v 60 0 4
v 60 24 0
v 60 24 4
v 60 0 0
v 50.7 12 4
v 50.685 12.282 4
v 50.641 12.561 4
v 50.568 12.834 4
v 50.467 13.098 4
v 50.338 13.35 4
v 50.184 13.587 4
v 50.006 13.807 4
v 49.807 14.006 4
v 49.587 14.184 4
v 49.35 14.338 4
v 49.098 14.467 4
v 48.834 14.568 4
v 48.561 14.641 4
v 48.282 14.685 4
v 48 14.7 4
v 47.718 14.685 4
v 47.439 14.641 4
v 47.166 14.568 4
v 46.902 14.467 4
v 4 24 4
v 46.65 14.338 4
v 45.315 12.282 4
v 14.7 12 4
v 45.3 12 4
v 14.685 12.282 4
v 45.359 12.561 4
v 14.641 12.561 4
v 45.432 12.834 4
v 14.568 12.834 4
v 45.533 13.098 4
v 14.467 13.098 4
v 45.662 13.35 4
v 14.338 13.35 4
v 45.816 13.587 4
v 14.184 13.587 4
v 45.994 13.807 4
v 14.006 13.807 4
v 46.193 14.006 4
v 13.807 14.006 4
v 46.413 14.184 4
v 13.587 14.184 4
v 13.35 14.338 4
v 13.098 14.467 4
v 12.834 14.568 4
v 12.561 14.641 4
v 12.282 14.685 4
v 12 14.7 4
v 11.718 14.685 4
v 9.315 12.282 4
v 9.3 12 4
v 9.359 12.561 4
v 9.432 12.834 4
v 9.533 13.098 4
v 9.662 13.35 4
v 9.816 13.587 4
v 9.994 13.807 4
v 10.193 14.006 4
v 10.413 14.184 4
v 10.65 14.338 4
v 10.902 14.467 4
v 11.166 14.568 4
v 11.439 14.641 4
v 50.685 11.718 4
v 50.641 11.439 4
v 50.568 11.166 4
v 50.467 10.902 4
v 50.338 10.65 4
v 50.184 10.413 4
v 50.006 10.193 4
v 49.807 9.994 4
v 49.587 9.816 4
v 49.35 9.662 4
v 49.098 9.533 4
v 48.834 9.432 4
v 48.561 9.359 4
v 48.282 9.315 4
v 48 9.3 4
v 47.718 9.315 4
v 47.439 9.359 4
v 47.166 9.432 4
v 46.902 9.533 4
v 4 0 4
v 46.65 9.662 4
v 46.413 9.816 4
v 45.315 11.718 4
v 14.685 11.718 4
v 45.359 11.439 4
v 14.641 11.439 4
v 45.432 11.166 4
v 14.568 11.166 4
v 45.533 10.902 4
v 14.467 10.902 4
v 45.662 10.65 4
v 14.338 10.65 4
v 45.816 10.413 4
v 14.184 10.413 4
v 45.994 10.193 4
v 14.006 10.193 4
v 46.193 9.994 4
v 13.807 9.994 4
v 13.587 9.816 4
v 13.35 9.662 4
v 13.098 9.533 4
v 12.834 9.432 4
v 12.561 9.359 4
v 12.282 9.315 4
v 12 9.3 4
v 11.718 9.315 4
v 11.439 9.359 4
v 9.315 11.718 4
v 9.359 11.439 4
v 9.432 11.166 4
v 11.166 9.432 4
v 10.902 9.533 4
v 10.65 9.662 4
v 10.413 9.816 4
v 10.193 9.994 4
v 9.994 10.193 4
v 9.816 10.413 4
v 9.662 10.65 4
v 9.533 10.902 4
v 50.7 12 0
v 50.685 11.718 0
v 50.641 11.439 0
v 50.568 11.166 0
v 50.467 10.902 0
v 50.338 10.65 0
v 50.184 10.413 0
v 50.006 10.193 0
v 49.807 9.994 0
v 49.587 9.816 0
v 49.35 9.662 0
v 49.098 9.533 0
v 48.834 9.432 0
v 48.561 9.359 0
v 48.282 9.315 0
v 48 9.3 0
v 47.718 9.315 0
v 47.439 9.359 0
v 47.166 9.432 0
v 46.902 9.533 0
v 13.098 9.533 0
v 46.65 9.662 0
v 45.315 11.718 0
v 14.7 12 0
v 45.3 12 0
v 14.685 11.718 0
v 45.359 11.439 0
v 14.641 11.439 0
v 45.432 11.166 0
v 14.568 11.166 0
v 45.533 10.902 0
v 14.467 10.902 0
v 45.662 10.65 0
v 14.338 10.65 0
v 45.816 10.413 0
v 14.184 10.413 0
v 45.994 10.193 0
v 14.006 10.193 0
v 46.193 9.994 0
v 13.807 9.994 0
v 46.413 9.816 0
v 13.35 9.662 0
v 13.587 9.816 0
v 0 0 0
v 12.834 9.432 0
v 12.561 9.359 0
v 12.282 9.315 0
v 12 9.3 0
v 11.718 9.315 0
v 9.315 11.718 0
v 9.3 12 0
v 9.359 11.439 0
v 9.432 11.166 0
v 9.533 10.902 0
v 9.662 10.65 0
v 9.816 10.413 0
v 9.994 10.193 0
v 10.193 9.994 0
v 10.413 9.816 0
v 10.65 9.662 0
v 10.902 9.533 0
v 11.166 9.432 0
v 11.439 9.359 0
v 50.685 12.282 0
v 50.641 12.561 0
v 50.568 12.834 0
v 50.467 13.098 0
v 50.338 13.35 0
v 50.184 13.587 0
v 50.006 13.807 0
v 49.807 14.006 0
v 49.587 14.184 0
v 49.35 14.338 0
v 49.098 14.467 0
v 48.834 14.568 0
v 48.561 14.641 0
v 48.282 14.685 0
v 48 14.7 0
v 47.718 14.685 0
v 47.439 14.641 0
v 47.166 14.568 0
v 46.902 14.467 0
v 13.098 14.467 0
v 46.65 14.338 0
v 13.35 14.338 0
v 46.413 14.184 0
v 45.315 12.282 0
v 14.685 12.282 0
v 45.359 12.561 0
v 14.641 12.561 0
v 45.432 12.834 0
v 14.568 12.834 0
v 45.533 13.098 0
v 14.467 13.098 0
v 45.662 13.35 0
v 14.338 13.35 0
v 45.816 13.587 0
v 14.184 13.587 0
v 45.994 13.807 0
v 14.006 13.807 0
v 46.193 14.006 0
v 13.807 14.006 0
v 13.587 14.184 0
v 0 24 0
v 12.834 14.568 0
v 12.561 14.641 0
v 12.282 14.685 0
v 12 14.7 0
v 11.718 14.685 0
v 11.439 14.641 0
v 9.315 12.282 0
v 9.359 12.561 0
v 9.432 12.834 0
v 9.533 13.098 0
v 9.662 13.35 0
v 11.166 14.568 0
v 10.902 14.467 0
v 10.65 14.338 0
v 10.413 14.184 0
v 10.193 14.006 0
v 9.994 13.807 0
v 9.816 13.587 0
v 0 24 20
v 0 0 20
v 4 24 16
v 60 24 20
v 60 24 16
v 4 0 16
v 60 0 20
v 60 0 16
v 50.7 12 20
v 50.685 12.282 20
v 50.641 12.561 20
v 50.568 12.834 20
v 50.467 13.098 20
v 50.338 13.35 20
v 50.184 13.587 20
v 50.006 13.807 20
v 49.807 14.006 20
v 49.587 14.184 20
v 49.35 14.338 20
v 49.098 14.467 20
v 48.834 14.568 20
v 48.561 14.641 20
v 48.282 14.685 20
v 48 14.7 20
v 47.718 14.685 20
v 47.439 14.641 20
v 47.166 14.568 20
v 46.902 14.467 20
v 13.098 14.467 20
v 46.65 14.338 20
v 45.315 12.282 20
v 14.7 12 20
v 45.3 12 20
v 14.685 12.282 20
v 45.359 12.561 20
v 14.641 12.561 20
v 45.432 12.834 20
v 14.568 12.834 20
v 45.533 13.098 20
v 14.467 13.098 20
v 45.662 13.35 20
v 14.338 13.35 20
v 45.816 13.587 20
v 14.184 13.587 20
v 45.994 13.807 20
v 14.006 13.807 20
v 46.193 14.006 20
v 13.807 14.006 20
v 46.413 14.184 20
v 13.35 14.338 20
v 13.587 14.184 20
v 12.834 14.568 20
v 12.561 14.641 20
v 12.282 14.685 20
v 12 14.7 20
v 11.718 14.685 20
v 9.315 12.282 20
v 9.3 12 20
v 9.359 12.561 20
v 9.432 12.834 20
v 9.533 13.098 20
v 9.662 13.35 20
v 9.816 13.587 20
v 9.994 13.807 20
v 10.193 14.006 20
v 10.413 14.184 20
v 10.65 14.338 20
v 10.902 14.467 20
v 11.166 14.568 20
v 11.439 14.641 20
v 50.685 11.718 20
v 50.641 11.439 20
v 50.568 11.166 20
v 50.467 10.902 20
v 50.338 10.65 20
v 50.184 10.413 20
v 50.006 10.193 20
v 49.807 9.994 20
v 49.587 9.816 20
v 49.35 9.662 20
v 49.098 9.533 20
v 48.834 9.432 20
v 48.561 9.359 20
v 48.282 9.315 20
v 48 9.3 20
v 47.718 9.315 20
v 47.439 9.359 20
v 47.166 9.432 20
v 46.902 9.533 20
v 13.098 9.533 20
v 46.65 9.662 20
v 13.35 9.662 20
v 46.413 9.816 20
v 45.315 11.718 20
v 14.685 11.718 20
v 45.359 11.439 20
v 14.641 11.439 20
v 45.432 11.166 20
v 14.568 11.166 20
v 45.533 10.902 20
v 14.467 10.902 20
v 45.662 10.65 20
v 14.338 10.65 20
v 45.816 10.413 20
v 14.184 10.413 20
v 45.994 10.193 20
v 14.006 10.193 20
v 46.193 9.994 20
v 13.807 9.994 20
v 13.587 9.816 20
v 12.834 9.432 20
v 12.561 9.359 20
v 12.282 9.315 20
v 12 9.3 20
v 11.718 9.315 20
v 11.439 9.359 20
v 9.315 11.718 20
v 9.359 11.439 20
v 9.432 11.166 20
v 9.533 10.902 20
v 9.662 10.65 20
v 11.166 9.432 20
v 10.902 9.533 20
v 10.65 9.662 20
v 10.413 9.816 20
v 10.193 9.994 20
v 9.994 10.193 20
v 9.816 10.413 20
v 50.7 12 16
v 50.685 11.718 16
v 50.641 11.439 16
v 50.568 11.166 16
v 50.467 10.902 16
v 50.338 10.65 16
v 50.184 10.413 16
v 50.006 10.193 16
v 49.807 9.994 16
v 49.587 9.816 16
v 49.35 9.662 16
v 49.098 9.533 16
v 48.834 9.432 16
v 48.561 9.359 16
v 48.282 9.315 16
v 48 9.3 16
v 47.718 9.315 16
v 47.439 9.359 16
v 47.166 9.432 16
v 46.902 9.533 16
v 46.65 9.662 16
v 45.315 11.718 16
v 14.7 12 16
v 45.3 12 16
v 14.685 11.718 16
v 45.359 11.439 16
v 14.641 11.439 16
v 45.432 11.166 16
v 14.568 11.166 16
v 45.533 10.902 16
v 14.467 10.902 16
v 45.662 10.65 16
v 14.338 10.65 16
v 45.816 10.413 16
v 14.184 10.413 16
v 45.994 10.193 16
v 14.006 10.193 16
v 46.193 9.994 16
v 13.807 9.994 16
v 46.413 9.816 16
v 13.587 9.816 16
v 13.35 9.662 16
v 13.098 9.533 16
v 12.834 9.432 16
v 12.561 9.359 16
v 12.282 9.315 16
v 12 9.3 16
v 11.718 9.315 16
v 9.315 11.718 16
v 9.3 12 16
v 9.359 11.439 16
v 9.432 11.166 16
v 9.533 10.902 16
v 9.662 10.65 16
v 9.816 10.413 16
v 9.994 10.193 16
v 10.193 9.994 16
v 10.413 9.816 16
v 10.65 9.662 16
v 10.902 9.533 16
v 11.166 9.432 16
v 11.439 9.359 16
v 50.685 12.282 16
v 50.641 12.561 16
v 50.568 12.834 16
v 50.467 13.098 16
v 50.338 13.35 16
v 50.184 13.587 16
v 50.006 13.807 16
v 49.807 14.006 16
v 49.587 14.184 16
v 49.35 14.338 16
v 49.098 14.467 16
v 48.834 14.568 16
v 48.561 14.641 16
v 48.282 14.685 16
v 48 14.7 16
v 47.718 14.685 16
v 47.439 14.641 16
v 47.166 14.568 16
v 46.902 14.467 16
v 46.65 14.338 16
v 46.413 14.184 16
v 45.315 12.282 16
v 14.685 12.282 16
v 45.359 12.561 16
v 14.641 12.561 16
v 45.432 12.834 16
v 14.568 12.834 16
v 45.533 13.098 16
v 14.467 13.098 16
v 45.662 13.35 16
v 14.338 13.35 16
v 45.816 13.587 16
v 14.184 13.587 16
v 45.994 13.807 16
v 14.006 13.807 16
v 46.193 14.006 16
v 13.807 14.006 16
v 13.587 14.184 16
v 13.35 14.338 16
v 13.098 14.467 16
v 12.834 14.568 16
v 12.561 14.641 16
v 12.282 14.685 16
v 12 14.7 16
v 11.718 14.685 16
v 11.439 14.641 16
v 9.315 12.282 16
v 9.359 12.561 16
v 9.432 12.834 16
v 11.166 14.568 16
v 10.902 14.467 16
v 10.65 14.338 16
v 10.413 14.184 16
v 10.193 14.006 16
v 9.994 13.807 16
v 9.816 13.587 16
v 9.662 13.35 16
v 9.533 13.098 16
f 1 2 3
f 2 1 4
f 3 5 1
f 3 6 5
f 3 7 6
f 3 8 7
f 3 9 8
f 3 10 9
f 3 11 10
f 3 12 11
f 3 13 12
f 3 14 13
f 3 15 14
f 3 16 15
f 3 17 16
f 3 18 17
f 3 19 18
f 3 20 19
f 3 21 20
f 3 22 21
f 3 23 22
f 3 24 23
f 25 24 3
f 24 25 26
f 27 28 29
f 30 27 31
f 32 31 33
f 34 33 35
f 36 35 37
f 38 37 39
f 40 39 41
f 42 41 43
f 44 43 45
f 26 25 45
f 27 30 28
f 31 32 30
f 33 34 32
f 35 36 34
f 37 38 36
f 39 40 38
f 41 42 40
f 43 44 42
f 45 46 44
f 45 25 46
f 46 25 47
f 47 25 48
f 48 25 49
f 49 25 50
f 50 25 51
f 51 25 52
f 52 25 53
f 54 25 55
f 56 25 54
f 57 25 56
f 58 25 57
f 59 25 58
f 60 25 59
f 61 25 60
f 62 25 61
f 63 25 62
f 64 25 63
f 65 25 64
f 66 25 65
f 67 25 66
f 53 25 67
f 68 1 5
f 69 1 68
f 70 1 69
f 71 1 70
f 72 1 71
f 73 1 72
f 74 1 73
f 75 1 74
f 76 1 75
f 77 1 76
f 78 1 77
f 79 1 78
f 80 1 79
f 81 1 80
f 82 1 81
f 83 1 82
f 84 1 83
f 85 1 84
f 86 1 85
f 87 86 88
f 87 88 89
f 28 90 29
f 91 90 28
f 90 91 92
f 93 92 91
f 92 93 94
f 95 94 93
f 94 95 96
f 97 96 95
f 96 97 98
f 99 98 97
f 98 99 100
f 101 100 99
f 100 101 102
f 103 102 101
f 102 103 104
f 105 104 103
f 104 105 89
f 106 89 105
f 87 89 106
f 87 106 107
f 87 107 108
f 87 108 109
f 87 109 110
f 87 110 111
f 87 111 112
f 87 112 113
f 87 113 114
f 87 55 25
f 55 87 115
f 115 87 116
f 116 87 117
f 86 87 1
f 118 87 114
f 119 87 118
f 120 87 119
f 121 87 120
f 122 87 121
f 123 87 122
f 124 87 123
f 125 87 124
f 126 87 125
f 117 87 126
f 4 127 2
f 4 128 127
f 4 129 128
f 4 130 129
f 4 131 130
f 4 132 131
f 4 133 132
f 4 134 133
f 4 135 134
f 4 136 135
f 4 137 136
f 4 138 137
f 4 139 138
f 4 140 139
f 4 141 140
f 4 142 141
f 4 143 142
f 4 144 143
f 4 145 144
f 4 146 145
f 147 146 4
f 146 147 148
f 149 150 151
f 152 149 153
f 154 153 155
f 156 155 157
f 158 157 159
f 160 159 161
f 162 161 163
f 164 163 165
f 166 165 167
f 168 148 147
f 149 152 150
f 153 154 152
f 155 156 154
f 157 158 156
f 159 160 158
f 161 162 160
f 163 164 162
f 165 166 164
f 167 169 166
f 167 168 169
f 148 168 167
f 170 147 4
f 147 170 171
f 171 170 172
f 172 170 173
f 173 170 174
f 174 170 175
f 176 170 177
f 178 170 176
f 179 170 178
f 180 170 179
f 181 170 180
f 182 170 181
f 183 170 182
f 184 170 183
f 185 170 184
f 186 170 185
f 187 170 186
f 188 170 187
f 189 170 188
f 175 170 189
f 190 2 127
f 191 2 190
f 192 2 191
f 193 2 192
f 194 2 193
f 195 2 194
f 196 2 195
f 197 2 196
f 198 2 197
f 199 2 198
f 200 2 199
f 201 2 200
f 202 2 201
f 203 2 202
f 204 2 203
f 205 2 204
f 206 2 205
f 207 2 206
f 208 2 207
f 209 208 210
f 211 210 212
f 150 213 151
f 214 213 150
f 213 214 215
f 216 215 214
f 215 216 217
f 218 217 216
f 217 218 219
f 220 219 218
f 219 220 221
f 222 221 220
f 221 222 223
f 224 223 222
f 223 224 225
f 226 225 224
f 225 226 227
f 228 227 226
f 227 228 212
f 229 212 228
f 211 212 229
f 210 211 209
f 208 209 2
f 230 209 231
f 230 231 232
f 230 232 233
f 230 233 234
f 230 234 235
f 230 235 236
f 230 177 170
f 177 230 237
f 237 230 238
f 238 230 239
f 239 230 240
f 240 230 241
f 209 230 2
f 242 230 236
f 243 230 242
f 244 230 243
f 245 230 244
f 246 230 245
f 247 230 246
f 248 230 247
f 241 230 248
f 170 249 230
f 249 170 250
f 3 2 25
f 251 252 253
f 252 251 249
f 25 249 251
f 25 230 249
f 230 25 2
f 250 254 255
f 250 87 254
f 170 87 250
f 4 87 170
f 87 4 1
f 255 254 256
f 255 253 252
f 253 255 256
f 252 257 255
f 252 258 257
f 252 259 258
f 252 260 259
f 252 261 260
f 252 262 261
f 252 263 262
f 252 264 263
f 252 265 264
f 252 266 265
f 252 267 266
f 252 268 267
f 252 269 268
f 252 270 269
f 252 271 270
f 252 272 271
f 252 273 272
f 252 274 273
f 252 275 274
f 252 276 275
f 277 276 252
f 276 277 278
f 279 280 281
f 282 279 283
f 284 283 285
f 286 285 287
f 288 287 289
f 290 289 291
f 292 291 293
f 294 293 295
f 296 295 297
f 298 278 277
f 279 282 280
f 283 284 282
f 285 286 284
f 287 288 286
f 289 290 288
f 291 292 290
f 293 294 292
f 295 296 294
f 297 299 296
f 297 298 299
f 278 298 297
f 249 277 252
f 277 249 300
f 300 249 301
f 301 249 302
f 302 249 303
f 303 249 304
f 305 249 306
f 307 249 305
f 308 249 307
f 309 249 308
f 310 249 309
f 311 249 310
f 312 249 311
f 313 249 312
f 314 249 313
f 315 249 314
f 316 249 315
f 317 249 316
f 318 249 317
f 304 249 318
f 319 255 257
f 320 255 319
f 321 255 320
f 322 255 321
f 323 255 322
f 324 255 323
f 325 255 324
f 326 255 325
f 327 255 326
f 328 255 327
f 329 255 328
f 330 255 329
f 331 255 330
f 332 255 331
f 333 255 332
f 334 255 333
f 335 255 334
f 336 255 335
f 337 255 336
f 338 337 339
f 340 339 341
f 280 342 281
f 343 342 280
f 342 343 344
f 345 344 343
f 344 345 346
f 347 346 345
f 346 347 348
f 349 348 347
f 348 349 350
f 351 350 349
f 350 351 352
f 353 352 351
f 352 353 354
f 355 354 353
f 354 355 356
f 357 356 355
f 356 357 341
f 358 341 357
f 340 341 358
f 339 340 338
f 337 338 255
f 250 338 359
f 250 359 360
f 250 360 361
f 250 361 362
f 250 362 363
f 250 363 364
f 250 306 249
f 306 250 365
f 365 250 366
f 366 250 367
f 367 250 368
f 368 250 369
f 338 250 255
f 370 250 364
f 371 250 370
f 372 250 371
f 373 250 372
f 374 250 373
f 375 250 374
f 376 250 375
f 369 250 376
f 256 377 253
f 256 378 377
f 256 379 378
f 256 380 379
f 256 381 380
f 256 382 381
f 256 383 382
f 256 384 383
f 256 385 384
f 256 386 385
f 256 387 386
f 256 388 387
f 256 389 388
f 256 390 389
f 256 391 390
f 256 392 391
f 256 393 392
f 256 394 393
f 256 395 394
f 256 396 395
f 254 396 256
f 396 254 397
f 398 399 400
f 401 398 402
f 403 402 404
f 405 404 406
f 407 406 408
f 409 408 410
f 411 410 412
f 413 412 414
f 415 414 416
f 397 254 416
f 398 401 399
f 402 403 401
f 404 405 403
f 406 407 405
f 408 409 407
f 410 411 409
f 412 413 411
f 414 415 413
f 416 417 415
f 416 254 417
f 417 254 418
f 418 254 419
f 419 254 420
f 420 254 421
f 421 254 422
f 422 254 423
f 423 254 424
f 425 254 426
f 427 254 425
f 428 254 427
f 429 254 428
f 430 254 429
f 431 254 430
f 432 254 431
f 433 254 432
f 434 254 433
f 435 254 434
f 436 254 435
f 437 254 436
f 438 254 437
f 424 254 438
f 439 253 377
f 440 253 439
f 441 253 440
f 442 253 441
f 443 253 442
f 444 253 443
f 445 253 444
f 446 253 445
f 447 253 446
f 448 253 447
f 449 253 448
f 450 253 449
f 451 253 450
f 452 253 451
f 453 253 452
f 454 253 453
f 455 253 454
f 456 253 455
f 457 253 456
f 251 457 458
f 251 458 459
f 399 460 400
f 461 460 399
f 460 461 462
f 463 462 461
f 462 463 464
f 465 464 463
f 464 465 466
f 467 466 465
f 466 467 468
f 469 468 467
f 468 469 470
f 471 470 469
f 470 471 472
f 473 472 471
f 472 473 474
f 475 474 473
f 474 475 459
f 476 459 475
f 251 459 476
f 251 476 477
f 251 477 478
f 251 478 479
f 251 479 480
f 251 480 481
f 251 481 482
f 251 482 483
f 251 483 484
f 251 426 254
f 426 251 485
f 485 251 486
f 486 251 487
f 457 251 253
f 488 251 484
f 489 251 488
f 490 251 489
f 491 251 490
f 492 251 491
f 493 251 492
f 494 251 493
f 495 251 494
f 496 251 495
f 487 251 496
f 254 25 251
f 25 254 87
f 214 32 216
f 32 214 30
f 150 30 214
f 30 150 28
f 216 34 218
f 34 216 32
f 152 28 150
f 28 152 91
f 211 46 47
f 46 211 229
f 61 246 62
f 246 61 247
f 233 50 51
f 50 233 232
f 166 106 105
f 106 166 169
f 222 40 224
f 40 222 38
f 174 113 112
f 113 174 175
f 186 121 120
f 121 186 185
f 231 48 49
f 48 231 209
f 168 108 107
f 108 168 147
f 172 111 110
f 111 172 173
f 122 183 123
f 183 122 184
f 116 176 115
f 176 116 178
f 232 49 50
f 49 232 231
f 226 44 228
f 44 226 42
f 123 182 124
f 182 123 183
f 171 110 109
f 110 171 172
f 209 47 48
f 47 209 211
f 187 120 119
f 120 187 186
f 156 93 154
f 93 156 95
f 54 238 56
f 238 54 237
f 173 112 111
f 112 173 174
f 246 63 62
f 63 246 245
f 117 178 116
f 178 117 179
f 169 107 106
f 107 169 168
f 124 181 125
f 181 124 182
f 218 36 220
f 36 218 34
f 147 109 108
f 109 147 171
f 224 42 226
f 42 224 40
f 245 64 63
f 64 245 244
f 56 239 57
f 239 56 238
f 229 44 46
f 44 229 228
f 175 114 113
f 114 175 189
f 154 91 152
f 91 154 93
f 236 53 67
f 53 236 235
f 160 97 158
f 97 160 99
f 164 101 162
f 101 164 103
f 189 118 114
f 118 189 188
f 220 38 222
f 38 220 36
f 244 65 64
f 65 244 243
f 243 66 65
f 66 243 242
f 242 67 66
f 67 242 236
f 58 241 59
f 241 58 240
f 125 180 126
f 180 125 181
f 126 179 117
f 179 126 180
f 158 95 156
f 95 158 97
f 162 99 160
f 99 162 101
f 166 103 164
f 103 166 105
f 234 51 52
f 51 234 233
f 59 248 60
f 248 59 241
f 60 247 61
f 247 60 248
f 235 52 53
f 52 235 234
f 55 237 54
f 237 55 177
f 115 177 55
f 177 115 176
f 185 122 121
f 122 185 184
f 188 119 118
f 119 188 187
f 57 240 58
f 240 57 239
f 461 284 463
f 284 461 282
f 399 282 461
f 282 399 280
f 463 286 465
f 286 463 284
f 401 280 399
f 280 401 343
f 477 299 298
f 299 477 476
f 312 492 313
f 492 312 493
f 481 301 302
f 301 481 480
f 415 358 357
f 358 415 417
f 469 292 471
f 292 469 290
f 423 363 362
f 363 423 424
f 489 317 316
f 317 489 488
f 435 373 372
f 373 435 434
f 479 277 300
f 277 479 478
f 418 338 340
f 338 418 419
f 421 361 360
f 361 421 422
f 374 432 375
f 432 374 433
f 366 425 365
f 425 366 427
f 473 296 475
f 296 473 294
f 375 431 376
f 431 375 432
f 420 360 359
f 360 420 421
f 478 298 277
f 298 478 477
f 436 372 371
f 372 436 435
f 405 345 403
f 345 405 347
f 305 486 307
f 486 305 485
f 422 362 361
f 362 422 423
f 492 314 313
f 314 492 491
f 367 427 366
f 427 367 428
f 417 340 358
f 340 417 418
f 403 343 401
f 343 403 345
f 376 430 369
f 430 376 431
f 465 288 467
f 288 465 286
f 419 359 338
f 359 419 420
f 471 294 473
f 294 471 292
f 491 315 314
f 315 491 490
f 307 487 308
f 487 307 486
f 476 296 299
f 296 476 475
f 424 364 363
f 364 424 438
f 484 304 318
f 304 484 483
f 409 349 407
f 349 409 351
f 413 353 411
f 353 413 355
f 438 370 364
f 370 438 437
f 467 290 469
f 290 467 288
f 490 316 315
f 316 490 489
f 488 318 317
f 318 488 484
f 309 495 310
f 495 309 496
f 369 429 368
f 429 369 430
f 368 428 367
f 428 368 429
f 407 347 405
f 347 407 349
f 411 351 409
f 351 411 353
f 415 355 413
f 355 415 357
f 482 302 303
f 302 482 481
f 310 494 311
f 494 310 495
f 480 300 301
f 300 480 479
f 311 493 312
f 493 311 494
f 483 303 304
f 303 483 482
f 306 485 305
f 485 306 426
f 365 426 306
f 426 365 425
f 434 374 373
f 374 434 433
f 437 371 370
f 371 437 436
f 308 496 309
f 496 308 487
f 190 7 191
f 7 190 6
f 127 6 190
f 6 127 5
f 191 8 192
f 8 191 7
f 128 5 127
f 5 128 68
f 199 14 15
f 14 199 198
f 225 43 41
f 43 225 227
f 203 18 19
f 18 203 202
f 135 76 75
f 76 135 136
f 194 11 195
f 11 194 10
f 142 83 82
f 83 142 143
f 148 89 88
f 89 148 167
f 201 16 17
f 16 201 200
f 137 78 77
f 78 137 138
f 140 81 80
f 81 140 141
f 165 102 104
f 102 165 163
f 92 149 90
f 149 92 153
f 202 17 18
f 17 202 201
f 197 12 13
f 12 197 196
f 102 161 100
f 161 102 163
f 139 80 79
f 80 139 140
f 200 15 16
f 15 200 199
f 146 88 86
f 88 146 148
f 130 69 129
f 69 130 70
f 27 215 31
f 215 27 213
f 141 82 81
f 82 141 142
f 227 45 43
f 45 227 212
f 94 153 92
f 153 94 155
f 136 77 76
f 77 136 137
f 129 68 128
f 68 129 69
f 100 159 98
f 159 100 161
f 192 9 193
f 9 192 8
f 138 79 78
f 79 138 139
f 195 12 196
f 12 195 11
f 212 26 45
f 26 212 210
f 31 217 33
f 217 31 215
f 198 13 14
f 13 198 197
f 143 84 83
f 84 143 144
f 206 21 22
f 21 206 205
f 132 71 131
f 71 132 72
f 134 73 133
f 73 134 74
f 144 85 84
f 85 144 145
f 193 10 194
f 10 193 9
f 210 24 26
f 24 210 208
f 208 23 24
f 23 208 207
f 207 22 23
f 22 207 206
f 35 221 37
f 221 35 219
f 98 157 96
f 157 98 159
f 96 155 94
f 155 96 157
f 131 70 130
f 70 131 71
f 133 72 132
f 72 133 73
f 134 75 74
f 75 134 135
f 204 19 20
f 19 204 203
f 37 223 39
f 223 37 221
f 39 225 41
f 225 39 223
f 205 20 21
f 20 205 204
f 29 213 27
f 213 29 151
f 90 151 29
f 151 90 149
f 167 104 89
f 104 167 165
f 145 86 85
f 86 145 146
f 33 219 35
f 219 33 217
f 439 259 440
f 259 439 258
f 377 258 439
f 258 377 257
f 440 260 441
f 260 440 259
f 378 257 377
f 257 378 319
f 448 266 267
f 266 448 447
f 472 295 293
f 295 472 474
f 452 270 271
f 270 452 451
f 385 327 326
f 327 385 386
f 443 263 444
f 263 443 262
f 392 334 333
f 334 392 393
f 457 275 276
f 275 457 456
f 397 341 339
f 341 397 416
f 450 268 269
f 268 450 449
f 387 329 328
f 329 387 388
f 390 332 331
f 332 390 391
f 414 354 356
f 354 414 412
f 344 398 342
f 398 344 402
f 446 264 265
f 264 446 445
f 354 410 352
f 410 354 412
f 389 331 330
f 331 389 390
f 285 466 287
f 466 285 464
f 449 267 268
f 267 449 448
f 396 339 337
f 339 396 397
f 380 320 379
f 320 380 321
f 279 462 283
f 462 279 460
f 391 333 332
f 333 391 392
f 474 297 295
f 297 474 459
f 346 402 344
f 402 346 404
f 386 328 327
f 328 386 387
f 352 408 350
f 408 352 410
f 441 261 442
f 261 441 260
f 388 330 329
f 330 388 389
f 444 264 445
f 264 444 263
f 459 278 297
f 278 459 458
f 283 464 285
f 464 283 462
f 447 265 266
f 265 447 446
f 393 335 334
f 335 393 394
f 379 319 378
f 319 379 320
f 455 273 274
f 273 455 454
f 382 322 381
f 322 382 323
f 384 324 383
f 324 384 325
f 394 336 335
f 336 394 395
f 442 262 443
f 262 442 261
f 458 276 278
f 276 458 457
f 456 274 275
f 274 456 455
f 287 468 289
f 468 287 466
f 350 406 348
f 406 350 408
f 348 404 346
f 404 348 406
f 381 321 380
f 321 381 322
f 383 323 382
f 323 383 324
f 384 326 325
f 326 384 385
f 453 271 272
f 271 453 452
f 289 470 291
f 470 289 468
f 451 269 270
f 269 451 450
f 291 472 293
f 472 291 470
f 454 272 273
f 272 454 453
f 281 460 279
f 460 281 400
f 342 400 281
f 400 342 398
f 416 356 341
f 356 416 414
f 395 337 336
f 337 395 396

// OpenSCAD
// Z-offset mounting bracket.
$fn = 60;
eps = 0.02;
length = 60;
height = 16;
width = 24;
thickness = 4;
difference() {
    union() {
        cube([length,width,thickness]);
        translate([0,0,height]) cube([length,width,thickness]);
        translate([0,0,thickness]) cube([thickness,width,height-thickness]);
    }
    for (x=[12,length-12]) {
        translate([x,width/2,-eps]) cylinder(d=5.4,h=thickness+2*eps);
        translate([x,width/2,height-eps]) cylinder(d=5.4,h=thickness+2*eps);
    }
}
